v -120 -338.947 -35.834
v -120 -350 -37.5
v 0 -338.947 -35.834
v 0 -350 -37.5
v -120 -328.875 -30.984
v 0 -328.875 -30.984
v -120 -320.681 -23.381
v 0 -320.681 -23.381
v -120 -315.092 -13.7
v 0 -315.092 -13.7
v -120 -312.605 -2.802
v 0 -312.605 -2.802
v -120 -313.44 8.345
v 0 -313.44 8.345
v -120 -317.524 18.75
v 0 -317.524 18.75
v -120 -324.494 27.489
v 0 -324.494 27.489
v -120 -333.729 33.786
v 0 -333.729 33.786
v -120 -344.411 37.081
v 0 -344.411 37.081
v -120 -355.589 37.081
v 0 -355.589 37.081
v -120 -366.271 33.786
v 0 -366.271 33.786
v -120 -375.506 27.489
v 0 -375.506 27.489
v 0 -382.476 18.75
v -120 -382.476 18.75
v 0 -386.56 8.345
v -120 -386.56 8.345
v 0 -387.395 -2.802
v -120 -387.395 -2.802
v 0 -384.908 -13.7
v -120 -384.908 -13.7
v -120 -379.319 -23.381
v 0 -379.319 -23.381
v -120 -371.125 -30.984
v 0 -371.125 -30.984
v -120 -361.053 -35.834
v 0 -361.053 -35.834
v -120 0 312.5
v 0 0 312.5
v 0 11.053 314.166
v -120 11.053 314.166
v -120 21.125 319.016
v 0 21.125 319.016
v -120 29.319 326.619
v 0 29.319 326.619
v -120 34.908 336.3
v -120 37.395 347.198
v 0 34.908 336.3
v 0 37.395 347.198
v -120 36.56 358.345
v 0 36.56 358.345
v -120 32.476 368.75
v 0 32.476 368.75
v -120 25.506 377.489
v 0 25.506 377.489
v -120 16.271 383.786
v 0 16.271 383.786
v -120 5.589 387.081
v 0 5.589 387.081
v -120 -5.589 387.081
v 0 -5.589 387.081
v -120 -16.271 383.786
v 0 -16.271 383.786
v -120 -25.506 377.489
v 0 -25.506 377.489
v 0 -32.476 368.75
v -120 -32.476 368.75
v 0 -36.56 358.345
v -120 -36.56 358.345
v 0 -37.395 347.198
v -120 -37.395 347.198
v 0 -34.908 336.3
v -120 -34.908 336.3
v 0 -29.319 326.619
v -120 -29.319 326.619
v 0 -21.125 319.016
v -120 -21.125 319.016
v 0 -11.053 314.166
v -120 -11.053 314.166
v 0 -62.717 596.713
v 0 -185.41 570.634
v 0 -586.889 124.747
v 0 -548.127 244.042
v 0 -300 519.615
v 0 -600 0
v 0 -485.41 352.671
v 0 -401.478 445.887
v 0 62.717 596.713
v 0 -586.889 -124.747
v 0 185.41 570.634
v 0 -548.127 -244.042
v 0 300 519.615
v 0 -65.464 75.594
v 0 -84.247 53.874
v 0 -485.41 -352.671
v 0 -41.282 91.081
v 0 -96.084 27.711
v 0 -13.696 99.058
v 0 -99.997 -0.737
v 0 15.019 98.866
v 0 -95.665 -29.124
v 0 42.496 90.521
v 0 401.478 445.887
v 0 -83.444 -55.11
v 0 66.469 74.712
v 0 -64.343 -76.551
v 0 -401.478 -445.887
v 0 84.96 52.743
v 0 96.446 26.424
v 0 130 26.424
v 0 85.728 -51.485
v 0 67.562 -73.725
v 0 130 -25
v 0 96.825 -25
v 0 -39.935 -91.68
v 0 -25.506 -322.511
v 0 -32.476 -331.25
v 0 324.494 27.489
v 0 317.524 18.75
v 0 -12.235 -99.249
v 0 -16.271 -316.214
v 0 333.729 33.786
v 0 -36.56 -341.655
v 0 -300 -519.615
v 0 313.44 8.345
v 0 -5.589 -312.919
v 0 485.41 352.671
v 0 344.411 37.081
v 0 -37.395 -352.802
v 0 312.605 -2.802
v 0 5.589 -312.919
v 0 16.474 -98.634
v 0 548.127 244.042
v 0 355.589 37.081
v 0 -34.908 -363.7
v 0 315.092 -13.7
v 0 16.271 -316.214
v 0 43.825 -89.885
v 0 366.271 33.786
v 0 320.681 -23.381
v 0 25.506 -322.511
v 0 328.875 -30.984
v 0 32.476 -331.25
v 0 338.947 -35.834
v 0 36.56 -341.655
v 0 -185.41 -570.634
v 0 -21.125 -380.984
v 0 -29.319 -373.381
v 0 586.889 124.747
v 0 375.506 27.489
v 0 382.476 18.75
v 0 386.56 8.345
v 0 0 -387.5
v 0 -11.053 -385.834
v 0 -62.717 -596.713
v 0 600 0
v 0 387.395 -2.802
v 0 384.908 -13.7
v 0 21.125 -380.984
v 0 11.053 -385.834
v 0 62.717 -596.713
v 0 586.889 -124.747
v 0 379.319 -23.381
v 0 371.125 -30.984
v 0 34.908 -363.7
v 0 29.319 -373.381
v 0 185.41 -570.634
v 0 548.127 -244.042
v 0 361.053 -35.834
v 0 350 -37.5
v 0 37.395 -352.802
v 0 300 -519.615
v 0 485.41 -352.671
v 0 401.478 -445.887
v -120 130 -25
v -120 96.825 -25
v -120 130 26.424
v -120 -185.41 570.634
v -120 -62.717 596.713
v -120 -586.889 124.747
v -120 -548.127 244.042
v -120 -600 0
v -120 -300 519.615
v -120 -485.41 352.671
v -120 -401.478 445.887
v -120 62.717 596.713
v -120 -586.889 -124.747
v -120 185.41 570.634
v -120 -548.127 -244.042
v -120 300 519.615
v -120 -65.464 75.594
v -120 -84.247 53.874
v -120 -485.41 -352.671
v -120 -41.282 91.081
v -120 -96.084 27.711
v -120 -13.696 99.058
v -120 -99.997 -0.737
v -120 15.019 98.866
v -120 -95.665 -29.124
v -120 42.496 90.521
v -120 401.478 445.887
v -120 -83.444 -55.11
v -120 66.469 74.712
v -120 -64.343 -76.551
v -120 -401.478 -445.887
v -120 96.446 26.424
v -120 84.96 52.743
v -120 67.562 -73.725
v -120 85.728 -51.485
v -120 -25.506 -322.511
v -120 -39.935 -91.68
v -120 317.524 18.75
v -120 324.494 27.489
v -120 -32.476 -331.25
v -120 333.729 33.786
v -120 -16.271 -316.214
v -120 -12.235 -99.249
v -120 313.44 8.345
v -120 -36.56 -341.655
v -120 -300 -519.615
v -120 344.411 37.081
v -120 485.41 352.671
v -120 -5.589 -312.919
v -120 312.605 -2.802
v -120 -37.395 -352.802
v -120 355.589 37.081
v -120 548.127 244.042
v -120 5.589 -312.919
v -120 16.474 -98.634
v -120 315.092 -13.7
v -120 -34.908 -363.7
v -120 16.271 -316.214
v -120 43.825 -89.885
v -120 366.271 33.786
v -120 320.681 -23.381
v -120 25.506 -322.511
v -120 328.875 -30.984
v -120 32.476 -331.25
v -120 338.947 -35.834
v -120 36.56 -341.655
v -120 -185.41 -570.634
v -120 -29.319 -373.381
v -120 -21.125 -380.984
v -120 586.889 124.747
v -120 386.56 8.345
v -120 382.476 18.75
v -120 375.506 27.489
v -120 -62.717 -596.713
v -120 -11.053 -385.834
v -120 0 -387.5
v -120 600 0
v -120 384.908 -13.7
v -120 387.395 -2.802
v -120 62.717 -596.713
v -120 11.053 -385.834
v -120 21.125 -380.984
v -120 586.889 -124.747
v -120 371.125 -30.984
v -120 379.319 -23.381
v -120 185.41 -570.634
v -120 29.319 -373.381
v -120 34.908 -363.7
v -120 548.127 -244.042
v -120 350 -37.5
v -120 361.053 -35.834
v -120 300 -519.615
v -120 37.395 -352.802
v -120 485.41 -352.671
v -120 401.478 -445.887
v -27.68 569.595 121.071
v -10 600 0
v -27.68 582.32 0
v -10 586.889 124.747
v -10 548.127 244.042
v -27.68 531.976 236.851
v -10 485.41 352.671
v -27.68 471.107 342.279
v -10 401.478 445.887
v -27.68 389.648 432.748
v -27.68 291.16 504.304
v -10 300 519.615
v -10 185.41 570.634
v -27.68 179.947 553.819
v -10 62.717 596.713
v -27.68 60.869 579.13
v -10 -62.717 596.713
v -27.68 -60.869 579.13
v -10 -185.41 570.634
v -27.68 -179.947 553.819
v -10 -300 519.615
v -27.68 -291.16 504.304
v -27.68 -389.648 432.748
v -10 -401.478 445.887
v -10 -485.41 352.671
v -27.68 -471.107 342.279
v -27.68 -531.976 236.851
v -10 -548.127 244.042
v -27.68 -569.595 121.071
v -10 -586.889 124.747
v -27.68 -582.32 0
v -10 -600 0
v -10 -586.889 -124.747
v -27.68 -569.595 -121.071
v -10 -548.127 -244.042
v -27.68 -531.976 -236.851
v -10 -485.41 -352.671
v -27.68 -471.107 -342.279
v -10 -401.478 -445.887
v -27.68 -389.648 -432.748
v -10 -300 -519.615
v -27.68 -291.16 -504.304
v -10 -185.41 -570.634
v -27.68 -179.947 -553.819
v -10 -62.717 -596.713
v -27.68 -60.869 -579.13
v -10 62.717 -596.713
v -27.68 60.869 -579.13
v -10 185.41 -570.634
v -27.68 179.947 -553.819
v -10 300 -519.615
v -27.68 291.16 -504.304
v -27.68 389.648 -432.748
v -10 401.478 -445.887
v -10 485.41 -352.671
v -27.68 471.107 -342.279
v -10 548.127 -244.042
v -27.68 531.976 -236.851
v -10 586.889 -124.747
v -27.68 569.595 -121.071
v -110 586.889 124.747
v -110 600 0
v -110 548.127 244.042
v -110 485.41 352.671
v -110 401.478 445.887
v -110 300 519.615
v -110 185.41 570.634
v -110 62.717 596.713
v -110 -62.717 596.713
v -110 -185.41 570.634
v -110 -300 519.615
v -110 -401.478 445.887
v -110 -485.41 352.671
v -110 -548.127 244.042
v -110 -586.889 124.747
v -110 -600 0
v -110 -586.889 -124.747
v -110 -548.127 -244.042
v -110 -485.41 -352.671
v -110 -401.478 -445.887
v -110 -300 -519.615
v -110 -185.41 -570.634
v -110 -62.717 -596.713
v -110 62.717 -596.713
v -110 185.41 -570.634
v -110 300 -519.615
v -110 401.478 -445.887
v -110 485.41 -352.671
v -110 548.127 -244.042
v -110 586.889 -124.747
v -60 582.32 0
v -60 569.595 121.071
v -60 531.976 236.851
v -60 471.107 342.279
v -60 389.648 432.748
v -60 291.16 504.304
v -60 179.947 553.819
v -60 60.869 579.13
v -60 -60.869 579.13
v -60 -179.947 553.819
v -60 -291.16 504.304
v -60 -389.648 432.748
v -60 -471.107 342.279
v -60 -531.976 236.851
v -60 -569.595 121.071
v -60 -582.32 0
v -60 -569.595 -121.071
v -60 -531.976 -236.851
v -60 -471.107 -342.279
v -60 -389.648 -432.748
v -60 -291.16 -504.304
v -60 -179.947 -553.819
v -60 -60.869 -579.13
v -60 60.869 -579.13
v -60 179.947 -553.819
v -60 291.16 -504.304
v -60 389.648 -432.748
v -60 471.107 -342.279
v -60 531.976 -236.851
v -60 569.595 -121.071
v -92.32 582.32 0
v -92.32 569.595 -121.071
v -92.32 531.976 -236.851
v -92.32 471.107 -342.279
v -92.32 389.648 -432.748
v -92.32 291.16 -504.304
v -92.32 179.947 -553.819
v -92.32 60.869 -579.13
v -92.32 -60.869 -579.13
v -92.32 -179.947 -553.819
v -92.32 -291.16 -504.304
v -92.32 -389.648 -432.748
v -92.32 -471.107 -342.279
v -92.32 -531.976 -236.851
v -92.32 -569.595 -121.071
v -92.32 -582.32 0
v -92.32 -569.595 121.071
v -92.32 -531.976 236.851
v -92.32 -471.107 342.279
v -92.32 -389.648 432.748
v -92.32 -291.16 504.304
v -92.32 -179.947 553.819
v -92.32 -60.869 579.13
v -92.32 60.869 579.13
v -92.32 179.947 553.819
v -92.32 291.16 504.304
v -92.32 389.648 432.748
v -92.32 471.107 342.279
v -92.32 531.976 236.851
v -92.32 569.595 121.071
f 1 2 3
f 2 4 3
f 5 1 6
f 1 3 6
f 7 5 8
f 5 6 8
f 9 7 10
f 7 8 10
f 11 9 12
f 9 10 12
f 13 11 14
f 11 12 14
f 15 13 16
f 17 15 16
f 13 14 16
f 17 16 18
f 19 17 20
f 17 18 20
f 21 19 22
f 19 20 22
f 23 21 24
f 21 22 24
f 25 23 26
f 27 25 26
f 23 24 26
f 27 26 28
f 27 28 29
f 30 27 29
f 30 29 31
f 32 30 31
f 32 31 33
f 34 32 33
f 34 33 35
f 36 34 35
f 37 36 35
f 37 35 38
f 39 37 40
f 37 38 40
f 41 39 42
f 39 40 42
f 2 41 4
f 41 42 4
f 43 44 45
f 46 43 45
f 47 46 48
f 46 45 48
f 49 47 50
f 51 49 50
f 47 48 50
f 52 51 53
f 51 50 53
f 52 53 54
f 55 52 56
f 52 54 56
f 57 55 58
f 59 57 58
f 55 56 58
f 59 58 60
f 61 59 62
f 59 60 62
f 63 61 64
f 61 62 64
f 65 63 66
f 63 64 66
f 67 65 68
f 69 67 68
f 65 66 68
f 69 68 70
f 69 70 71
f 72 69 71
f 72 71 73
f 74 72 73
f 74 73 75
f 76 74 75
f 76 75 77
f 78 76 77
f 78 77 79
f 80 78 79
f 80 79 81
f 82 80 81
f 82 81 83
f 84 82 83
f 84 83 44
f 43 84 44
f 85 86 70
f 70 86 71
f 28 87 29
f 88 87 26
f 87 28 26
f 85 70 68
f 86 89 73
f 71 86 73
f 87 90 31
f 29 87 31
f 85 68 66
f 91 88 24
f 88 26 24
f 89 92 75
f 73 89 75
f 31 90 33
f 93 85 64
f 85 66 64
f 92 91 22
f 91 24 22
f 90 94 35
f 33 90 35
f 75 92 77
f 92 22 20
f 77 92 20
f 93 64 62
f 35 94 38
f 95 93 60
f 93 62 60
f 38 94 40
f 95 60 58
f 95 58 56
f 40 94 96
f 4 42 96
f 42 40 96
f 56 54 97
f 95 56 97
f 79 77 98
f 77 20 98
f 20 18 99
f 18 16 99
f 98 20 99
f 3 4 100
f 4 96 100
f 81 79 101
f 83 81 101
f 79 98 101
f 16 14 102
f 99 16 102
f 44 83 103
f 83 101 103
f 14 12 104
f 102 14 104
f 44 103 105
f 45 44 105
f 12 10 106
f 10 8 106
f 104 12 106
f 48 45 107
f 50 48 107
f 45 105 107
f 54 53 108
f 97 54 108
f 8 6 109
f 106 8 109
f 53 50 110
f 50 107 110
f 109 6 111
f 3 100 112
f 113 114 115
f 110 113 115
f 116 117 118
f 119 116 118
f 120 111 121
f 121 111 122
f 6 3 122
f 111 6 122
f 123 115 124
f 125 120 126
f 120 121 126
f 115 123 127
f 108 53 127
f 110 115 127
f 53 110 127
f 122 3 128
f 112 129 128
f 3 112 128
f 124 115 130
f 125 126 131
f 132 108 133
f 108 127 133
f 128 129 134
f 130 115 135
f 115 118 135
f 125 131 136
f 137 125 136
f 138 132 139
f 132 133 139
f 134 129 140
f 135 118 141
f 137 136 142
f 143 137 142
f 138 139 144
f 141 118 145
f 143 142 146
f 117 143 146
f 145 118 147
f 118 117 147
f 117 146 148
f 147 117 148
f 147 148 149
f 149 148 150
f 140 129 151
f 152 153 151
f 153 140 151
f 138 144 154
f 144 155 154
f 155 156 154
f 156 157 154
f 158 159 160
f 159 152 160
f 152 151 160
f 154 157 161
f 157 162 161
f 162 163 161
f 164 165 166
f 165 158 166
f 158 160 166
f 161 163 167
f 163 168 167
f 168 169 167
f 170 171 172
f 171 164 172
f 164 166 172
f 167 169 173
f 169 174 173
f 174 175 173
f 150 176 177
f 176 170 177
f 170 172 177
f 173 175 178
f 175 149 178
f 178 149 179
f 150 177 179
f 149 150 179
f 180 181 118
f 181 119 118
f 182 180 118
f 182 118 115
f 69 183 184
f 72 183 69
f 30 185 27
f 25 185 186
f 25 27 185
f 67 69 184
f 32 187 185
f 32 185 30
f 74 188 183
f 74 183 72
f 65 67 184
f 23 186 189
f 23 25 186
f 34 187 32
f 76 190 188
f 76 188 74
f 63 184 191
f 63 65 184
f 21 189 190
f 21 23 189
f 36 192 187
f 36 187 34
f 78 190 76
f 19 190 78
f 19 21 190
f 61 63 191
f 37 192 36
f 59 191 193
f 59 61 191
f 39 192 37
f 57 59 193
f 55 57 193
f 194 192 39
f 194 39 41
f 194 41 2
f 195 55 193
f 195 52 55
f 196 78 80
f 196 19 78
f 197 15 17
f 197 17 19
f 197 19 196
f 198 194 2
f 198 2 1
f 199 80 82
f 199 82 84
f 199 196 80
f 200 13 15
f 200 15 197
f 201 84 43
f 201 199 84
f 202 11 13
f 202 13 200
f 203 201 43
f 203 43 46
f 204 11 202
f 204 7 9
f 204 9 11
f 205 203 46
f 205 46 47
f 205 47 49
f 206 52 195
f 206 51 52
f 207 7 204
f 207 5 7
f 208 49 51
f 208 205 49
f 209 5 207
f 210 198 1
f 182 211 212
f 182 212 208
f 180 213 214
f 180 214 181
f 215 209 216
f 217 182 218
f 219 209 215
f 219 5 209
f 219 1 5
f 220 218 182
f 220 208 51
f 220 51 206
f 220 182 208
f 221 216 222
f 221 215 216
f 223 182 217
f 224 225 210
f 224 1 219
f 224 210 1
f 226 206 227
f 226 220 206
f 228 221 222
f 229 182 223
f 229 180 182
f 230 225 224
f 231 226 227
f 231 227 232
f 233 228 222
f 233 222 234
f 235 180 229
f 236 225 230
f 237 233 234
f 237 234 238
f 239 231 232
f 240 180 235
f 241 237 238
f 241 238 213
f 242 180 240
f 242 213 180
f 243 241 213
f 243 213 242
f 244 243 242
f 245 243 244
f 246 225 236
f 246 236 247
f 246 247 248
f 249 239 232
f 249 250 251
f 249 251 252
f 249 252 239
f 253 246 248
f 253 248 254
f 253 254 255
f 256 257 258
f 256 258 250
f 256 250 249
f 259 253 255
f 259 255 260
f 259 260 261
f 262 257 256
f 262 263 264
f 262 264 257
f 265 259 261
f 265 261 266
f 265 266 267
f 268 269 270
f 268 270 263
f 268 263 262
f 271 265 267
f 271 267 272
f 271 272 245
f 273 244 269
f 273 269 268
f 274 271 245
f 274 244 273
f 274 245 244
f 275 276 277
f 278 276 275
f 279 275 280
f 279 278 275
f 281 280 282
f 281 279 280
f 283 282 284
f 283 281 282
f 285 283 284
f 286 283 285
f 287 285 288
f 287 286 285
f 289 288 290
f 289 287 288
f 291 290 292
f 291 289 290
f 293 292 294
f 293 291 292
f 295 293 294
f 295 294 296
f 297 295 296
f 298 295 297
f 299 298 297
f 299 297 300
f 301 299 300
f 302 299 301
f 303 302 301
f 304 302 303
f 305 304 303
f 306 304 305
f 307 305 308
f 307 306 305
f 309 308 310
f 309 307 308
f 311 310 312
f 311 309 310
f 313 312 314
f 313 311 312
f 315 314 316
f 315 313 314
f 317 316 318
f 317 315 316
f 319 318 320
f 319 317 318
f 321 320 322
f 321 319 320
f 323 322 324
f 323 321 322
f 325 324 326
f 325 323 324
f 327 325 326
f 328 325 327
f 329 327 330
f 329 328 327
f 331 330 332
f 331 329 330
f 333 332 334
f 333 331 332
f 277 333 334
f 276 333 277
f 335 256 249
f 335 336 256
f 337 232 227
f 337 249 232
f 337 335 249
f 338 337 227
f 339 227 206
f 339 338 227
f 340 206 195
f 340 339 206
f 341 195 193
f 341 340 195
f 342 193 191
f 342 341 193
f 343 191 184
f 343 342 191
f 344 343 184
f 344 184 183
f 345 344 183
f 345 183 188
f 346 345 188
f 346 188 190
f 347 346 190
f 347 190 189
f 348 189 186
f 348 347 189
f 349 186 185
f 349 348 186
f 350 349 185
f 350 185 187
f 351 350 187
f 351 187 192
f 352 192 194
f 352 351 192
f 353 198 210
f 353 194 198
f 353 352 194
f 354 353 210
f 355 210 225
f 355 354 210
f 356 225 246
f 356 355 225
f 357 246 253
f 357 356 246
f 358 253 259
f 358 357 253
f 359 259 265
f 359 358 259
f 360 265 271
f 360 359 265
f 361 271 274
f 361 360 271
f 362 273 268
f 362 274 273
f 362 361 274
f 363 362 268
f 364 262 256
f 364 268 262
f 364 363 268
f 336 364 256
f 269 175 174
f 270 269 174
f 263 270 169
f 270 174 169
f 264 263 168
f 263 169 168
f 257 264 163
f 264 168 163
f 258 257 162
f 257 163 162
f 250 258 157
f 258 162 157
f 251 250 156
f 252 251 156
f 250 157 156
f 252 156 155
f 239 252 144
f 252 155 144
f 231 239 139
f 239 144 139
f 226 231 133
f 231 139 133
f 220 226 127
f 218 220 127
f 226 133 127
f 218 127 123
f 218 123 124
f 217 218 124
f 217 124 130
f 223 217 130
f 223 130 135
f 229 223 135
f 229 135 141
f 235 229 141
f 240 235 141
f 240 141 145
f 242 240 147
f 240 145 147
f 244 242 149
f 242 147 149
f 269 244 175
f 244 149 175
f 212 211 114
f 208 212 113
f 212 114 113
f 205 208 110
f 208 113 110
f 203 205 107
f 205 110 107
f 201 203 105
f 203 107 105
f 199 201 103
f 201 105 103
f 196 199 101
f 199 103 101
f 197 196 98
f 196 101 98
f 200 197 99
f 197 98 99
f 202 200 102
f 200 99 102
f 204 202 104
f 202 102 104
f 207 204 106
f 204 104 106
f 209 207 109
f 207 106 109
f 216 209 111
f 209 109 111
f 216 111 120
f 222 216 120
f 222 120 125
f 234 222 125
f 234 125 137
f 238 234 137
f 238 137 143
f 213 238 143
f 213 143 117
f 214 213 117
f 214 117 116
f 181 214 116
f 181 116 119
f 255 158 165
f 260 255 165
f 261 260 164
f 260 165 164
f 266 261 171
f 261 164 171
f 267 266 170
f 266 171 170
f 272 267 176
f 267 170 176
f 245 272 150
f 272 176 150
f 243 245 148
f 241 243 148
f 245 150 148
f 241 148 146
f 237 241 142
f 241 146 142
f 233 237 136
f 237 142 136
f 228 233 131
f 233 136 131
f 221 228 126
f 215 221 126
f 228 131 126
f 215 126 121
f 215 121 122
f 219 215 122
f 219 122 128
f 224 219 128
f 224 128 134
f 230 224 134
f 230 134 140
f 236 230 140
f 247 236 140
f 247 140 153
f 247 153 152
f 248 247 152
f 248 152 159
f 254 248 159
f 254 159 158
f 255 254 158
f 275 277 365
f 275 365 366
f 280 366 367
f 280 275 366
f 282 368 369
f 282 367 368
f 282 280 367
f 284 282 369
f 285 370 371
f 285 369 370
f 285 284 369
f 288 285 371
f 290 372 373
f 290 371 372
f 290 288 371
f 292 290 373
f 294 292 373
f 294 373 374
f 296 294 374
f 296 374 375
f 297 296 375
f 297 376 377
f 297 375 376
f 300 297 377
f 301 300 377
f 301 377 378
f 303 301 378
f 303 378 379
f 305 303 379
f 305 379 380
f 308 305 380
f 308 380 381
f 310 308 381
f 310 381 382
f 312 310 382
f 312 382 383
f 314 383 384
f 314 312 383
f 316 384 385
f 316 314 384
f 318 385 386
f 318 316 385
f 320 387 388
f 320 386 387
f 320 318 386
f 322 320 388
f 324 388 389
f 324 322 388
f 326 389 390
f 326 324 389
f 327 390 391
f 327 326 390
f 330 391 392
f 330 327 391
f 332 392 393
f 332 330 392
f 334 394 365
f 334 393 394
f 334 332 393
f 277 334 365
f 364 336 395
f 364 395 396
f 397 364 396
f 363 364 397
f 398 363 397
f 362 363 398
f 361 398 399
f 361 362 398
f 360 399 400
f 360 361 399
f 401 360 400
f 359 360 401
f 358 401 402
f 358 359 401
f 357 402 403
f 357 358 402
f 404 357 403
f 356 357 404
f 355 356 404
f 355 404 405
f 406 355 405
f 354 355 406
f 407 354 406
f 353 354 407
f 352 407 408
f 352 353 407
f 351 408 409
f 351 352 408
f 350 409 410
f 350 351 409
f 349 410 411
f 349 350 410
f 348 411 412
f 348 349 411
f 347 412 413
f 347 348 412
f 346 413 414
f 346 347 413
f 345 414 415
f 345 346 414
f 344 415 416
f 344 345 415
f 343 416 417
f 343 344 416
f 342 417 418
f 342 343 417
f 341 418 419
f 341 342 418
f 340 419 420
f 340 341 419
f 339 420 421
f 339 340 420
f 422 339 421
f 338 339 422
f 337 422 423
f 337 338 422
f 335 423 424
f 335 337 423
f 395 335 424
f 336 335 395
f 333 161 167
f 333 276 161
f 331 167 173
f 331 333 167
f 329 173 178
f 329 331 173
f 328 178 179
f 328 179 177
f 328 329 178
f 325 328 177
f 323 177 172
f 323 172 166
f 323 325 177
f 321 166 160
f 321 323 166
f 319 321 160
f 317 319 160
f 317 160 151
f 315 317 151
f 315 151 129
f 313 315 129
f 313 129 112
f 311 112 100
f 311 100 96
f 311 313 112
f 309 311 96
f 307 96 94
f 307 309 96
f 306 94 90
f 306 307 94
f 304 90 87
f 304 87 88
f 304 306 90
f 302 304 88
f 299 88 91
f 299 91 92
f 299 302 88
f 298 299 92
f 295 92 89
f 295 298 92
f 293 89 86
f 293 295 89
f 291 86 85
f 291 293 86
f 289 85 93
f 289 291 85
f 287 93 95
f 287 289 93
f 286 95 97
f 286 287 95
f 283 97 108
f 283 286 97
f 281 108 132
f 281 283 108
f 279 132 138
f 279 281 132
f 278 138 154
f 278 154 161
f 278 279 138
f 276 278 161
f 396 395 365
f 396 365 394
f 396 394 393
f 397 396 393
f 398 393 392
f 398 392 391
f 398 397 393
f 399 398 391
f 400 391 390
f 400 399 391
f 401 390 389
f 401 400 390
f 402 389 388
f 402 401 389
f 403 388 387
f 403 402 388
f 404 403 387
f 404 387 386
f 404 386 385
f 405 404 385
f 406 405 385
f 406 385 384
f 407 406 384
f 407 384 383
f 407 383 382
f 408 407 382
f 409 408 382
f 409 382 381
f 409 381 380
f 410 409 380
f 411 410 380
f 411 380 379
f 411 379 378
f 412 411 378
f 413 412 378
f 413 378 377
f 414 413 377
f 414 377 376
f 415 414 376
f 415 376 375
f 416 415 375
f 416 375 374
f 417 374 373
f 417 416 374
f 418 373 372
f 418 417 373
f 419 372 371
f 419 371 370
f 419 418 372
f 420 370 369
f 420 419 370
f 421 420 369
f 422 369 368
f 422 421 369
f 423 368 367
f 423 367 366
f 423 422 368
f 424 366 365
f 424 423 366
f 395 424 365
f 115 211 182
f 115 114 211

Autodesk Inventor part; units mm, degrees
ref_plane "YZ Plane" through (0, 0, 0) normal (1, 0, 0) x (0, 1, 0)
ref_plane "XZ Plane" through (0, 0, 0) normal (0, 1, 0) x (-1, 0, 0)
ref_plane "XY Plane" through (0, 0, 0) normal (0, 0, 1) x (1, 0, 0)
sketch "Sketch1" plane through (0, 0, 0) normal (0, 0, 1) x (1, 0, 0)
  line L0 (0, 0) -> (-120, 0)
  line L1 (-120, 0) -> (-120, 600)
  line L2 (0, 600) -> (0, 0)
  line L3 (-120, 600) -> (-110, 600)
  line L4 (0, 600) -> (-10, 600)
  line L5 (-60, 582.32) -> (-27.68, 582.32)
  line L6 (-60, 582.32) -> (-92.32, 582.32)
  line L7 (-110, 600) -> (-92.32, 582.32)
  line L8 (-27.68, 582.32) -> (-10, 600)
  line L9 (-120, 600) -> (-110, 600)
  line L10 (-10, 600) -> (0, 600)
  dimension "d0" = 120
  dimension "d1" = 600
  dimension "d3" = 10
  dimension "d4" = 10
  dimension "d5" = 32.32
  dimension "d6" = 32.32
sketch "Sketch2" plane through (0, 0, 0) normal (1, 0, 0) x (0, 1, 0)
  circle A0 centre (0, 0) radius 100
  dimension "d7" = 200
sketch "Sketch3" plane through (0, 0, 0) normal (0, 0, 1) x (1, 0, 0)
  line L0 (0, 0) -> (0, 1416.3001) construction
revolve "Revolution1" add sketch "Sketch1" angle 360 about axis through (0, 0, 0) along (-1, 0, 0)
extrude "Extrusion1" cut sketch "Sketch2" against normal through all
sketch "Sketch4" plane through (0, 0, 0) normal (1, 0, 0) x (0, 0, -1)
  circle A0 centre (0, 0) radius 100 projected
  line L0 (0, 0) -> (25, 0)
  line L1 (25, 96.8246) -> (25, 130)
  line L2 (25, 130) -> (0, 130)
  line L3 (0, 0) -> (-26.4239, 0)
  line L4 (-26.4239, 96.4457) -> (-26.4239, 130)
  line L5 (-26.4239, 130) -> (0, 130)
  dimension "d11" = 25
  dimension "d12" = 130
extrude "Extrusion2" cut sketch "Sketch4" against normal through all contours A0 L4 L5 L2 L1
sketch "Sketch5" plane through (0, 0, 0) normal (1, 0, 0) x (0, 0, -1)
  line L0 (0, 0) -> (350, 0)
  line L1 (0, 0) -> (0, 350)
  line L2 (0, 0) -> (-350, 0)
  line L3 (0, 0) -> (0, -350)
  circle A0 centre (0, 350) radius 37.5
  circle A1 centre (350, 0) radius 37.5
  circle A2 centre (0, -350) radius 37.5
  circle A3 centre (-350, 0) radius 37.5
  dimension "d15" = 350
  dimension "d16" = 350
  dimension "d17" = 350
  dimension "d18" = 350
  dimension "d19" = 75
  dimension "d20" = 75
  dimension "d21" = 75
  dimension "d22" = 75
extrude "Extrusion3" cut sketch "Sketch5" against normal through all
properties part number "P#2_LAB_DINAMICA"
